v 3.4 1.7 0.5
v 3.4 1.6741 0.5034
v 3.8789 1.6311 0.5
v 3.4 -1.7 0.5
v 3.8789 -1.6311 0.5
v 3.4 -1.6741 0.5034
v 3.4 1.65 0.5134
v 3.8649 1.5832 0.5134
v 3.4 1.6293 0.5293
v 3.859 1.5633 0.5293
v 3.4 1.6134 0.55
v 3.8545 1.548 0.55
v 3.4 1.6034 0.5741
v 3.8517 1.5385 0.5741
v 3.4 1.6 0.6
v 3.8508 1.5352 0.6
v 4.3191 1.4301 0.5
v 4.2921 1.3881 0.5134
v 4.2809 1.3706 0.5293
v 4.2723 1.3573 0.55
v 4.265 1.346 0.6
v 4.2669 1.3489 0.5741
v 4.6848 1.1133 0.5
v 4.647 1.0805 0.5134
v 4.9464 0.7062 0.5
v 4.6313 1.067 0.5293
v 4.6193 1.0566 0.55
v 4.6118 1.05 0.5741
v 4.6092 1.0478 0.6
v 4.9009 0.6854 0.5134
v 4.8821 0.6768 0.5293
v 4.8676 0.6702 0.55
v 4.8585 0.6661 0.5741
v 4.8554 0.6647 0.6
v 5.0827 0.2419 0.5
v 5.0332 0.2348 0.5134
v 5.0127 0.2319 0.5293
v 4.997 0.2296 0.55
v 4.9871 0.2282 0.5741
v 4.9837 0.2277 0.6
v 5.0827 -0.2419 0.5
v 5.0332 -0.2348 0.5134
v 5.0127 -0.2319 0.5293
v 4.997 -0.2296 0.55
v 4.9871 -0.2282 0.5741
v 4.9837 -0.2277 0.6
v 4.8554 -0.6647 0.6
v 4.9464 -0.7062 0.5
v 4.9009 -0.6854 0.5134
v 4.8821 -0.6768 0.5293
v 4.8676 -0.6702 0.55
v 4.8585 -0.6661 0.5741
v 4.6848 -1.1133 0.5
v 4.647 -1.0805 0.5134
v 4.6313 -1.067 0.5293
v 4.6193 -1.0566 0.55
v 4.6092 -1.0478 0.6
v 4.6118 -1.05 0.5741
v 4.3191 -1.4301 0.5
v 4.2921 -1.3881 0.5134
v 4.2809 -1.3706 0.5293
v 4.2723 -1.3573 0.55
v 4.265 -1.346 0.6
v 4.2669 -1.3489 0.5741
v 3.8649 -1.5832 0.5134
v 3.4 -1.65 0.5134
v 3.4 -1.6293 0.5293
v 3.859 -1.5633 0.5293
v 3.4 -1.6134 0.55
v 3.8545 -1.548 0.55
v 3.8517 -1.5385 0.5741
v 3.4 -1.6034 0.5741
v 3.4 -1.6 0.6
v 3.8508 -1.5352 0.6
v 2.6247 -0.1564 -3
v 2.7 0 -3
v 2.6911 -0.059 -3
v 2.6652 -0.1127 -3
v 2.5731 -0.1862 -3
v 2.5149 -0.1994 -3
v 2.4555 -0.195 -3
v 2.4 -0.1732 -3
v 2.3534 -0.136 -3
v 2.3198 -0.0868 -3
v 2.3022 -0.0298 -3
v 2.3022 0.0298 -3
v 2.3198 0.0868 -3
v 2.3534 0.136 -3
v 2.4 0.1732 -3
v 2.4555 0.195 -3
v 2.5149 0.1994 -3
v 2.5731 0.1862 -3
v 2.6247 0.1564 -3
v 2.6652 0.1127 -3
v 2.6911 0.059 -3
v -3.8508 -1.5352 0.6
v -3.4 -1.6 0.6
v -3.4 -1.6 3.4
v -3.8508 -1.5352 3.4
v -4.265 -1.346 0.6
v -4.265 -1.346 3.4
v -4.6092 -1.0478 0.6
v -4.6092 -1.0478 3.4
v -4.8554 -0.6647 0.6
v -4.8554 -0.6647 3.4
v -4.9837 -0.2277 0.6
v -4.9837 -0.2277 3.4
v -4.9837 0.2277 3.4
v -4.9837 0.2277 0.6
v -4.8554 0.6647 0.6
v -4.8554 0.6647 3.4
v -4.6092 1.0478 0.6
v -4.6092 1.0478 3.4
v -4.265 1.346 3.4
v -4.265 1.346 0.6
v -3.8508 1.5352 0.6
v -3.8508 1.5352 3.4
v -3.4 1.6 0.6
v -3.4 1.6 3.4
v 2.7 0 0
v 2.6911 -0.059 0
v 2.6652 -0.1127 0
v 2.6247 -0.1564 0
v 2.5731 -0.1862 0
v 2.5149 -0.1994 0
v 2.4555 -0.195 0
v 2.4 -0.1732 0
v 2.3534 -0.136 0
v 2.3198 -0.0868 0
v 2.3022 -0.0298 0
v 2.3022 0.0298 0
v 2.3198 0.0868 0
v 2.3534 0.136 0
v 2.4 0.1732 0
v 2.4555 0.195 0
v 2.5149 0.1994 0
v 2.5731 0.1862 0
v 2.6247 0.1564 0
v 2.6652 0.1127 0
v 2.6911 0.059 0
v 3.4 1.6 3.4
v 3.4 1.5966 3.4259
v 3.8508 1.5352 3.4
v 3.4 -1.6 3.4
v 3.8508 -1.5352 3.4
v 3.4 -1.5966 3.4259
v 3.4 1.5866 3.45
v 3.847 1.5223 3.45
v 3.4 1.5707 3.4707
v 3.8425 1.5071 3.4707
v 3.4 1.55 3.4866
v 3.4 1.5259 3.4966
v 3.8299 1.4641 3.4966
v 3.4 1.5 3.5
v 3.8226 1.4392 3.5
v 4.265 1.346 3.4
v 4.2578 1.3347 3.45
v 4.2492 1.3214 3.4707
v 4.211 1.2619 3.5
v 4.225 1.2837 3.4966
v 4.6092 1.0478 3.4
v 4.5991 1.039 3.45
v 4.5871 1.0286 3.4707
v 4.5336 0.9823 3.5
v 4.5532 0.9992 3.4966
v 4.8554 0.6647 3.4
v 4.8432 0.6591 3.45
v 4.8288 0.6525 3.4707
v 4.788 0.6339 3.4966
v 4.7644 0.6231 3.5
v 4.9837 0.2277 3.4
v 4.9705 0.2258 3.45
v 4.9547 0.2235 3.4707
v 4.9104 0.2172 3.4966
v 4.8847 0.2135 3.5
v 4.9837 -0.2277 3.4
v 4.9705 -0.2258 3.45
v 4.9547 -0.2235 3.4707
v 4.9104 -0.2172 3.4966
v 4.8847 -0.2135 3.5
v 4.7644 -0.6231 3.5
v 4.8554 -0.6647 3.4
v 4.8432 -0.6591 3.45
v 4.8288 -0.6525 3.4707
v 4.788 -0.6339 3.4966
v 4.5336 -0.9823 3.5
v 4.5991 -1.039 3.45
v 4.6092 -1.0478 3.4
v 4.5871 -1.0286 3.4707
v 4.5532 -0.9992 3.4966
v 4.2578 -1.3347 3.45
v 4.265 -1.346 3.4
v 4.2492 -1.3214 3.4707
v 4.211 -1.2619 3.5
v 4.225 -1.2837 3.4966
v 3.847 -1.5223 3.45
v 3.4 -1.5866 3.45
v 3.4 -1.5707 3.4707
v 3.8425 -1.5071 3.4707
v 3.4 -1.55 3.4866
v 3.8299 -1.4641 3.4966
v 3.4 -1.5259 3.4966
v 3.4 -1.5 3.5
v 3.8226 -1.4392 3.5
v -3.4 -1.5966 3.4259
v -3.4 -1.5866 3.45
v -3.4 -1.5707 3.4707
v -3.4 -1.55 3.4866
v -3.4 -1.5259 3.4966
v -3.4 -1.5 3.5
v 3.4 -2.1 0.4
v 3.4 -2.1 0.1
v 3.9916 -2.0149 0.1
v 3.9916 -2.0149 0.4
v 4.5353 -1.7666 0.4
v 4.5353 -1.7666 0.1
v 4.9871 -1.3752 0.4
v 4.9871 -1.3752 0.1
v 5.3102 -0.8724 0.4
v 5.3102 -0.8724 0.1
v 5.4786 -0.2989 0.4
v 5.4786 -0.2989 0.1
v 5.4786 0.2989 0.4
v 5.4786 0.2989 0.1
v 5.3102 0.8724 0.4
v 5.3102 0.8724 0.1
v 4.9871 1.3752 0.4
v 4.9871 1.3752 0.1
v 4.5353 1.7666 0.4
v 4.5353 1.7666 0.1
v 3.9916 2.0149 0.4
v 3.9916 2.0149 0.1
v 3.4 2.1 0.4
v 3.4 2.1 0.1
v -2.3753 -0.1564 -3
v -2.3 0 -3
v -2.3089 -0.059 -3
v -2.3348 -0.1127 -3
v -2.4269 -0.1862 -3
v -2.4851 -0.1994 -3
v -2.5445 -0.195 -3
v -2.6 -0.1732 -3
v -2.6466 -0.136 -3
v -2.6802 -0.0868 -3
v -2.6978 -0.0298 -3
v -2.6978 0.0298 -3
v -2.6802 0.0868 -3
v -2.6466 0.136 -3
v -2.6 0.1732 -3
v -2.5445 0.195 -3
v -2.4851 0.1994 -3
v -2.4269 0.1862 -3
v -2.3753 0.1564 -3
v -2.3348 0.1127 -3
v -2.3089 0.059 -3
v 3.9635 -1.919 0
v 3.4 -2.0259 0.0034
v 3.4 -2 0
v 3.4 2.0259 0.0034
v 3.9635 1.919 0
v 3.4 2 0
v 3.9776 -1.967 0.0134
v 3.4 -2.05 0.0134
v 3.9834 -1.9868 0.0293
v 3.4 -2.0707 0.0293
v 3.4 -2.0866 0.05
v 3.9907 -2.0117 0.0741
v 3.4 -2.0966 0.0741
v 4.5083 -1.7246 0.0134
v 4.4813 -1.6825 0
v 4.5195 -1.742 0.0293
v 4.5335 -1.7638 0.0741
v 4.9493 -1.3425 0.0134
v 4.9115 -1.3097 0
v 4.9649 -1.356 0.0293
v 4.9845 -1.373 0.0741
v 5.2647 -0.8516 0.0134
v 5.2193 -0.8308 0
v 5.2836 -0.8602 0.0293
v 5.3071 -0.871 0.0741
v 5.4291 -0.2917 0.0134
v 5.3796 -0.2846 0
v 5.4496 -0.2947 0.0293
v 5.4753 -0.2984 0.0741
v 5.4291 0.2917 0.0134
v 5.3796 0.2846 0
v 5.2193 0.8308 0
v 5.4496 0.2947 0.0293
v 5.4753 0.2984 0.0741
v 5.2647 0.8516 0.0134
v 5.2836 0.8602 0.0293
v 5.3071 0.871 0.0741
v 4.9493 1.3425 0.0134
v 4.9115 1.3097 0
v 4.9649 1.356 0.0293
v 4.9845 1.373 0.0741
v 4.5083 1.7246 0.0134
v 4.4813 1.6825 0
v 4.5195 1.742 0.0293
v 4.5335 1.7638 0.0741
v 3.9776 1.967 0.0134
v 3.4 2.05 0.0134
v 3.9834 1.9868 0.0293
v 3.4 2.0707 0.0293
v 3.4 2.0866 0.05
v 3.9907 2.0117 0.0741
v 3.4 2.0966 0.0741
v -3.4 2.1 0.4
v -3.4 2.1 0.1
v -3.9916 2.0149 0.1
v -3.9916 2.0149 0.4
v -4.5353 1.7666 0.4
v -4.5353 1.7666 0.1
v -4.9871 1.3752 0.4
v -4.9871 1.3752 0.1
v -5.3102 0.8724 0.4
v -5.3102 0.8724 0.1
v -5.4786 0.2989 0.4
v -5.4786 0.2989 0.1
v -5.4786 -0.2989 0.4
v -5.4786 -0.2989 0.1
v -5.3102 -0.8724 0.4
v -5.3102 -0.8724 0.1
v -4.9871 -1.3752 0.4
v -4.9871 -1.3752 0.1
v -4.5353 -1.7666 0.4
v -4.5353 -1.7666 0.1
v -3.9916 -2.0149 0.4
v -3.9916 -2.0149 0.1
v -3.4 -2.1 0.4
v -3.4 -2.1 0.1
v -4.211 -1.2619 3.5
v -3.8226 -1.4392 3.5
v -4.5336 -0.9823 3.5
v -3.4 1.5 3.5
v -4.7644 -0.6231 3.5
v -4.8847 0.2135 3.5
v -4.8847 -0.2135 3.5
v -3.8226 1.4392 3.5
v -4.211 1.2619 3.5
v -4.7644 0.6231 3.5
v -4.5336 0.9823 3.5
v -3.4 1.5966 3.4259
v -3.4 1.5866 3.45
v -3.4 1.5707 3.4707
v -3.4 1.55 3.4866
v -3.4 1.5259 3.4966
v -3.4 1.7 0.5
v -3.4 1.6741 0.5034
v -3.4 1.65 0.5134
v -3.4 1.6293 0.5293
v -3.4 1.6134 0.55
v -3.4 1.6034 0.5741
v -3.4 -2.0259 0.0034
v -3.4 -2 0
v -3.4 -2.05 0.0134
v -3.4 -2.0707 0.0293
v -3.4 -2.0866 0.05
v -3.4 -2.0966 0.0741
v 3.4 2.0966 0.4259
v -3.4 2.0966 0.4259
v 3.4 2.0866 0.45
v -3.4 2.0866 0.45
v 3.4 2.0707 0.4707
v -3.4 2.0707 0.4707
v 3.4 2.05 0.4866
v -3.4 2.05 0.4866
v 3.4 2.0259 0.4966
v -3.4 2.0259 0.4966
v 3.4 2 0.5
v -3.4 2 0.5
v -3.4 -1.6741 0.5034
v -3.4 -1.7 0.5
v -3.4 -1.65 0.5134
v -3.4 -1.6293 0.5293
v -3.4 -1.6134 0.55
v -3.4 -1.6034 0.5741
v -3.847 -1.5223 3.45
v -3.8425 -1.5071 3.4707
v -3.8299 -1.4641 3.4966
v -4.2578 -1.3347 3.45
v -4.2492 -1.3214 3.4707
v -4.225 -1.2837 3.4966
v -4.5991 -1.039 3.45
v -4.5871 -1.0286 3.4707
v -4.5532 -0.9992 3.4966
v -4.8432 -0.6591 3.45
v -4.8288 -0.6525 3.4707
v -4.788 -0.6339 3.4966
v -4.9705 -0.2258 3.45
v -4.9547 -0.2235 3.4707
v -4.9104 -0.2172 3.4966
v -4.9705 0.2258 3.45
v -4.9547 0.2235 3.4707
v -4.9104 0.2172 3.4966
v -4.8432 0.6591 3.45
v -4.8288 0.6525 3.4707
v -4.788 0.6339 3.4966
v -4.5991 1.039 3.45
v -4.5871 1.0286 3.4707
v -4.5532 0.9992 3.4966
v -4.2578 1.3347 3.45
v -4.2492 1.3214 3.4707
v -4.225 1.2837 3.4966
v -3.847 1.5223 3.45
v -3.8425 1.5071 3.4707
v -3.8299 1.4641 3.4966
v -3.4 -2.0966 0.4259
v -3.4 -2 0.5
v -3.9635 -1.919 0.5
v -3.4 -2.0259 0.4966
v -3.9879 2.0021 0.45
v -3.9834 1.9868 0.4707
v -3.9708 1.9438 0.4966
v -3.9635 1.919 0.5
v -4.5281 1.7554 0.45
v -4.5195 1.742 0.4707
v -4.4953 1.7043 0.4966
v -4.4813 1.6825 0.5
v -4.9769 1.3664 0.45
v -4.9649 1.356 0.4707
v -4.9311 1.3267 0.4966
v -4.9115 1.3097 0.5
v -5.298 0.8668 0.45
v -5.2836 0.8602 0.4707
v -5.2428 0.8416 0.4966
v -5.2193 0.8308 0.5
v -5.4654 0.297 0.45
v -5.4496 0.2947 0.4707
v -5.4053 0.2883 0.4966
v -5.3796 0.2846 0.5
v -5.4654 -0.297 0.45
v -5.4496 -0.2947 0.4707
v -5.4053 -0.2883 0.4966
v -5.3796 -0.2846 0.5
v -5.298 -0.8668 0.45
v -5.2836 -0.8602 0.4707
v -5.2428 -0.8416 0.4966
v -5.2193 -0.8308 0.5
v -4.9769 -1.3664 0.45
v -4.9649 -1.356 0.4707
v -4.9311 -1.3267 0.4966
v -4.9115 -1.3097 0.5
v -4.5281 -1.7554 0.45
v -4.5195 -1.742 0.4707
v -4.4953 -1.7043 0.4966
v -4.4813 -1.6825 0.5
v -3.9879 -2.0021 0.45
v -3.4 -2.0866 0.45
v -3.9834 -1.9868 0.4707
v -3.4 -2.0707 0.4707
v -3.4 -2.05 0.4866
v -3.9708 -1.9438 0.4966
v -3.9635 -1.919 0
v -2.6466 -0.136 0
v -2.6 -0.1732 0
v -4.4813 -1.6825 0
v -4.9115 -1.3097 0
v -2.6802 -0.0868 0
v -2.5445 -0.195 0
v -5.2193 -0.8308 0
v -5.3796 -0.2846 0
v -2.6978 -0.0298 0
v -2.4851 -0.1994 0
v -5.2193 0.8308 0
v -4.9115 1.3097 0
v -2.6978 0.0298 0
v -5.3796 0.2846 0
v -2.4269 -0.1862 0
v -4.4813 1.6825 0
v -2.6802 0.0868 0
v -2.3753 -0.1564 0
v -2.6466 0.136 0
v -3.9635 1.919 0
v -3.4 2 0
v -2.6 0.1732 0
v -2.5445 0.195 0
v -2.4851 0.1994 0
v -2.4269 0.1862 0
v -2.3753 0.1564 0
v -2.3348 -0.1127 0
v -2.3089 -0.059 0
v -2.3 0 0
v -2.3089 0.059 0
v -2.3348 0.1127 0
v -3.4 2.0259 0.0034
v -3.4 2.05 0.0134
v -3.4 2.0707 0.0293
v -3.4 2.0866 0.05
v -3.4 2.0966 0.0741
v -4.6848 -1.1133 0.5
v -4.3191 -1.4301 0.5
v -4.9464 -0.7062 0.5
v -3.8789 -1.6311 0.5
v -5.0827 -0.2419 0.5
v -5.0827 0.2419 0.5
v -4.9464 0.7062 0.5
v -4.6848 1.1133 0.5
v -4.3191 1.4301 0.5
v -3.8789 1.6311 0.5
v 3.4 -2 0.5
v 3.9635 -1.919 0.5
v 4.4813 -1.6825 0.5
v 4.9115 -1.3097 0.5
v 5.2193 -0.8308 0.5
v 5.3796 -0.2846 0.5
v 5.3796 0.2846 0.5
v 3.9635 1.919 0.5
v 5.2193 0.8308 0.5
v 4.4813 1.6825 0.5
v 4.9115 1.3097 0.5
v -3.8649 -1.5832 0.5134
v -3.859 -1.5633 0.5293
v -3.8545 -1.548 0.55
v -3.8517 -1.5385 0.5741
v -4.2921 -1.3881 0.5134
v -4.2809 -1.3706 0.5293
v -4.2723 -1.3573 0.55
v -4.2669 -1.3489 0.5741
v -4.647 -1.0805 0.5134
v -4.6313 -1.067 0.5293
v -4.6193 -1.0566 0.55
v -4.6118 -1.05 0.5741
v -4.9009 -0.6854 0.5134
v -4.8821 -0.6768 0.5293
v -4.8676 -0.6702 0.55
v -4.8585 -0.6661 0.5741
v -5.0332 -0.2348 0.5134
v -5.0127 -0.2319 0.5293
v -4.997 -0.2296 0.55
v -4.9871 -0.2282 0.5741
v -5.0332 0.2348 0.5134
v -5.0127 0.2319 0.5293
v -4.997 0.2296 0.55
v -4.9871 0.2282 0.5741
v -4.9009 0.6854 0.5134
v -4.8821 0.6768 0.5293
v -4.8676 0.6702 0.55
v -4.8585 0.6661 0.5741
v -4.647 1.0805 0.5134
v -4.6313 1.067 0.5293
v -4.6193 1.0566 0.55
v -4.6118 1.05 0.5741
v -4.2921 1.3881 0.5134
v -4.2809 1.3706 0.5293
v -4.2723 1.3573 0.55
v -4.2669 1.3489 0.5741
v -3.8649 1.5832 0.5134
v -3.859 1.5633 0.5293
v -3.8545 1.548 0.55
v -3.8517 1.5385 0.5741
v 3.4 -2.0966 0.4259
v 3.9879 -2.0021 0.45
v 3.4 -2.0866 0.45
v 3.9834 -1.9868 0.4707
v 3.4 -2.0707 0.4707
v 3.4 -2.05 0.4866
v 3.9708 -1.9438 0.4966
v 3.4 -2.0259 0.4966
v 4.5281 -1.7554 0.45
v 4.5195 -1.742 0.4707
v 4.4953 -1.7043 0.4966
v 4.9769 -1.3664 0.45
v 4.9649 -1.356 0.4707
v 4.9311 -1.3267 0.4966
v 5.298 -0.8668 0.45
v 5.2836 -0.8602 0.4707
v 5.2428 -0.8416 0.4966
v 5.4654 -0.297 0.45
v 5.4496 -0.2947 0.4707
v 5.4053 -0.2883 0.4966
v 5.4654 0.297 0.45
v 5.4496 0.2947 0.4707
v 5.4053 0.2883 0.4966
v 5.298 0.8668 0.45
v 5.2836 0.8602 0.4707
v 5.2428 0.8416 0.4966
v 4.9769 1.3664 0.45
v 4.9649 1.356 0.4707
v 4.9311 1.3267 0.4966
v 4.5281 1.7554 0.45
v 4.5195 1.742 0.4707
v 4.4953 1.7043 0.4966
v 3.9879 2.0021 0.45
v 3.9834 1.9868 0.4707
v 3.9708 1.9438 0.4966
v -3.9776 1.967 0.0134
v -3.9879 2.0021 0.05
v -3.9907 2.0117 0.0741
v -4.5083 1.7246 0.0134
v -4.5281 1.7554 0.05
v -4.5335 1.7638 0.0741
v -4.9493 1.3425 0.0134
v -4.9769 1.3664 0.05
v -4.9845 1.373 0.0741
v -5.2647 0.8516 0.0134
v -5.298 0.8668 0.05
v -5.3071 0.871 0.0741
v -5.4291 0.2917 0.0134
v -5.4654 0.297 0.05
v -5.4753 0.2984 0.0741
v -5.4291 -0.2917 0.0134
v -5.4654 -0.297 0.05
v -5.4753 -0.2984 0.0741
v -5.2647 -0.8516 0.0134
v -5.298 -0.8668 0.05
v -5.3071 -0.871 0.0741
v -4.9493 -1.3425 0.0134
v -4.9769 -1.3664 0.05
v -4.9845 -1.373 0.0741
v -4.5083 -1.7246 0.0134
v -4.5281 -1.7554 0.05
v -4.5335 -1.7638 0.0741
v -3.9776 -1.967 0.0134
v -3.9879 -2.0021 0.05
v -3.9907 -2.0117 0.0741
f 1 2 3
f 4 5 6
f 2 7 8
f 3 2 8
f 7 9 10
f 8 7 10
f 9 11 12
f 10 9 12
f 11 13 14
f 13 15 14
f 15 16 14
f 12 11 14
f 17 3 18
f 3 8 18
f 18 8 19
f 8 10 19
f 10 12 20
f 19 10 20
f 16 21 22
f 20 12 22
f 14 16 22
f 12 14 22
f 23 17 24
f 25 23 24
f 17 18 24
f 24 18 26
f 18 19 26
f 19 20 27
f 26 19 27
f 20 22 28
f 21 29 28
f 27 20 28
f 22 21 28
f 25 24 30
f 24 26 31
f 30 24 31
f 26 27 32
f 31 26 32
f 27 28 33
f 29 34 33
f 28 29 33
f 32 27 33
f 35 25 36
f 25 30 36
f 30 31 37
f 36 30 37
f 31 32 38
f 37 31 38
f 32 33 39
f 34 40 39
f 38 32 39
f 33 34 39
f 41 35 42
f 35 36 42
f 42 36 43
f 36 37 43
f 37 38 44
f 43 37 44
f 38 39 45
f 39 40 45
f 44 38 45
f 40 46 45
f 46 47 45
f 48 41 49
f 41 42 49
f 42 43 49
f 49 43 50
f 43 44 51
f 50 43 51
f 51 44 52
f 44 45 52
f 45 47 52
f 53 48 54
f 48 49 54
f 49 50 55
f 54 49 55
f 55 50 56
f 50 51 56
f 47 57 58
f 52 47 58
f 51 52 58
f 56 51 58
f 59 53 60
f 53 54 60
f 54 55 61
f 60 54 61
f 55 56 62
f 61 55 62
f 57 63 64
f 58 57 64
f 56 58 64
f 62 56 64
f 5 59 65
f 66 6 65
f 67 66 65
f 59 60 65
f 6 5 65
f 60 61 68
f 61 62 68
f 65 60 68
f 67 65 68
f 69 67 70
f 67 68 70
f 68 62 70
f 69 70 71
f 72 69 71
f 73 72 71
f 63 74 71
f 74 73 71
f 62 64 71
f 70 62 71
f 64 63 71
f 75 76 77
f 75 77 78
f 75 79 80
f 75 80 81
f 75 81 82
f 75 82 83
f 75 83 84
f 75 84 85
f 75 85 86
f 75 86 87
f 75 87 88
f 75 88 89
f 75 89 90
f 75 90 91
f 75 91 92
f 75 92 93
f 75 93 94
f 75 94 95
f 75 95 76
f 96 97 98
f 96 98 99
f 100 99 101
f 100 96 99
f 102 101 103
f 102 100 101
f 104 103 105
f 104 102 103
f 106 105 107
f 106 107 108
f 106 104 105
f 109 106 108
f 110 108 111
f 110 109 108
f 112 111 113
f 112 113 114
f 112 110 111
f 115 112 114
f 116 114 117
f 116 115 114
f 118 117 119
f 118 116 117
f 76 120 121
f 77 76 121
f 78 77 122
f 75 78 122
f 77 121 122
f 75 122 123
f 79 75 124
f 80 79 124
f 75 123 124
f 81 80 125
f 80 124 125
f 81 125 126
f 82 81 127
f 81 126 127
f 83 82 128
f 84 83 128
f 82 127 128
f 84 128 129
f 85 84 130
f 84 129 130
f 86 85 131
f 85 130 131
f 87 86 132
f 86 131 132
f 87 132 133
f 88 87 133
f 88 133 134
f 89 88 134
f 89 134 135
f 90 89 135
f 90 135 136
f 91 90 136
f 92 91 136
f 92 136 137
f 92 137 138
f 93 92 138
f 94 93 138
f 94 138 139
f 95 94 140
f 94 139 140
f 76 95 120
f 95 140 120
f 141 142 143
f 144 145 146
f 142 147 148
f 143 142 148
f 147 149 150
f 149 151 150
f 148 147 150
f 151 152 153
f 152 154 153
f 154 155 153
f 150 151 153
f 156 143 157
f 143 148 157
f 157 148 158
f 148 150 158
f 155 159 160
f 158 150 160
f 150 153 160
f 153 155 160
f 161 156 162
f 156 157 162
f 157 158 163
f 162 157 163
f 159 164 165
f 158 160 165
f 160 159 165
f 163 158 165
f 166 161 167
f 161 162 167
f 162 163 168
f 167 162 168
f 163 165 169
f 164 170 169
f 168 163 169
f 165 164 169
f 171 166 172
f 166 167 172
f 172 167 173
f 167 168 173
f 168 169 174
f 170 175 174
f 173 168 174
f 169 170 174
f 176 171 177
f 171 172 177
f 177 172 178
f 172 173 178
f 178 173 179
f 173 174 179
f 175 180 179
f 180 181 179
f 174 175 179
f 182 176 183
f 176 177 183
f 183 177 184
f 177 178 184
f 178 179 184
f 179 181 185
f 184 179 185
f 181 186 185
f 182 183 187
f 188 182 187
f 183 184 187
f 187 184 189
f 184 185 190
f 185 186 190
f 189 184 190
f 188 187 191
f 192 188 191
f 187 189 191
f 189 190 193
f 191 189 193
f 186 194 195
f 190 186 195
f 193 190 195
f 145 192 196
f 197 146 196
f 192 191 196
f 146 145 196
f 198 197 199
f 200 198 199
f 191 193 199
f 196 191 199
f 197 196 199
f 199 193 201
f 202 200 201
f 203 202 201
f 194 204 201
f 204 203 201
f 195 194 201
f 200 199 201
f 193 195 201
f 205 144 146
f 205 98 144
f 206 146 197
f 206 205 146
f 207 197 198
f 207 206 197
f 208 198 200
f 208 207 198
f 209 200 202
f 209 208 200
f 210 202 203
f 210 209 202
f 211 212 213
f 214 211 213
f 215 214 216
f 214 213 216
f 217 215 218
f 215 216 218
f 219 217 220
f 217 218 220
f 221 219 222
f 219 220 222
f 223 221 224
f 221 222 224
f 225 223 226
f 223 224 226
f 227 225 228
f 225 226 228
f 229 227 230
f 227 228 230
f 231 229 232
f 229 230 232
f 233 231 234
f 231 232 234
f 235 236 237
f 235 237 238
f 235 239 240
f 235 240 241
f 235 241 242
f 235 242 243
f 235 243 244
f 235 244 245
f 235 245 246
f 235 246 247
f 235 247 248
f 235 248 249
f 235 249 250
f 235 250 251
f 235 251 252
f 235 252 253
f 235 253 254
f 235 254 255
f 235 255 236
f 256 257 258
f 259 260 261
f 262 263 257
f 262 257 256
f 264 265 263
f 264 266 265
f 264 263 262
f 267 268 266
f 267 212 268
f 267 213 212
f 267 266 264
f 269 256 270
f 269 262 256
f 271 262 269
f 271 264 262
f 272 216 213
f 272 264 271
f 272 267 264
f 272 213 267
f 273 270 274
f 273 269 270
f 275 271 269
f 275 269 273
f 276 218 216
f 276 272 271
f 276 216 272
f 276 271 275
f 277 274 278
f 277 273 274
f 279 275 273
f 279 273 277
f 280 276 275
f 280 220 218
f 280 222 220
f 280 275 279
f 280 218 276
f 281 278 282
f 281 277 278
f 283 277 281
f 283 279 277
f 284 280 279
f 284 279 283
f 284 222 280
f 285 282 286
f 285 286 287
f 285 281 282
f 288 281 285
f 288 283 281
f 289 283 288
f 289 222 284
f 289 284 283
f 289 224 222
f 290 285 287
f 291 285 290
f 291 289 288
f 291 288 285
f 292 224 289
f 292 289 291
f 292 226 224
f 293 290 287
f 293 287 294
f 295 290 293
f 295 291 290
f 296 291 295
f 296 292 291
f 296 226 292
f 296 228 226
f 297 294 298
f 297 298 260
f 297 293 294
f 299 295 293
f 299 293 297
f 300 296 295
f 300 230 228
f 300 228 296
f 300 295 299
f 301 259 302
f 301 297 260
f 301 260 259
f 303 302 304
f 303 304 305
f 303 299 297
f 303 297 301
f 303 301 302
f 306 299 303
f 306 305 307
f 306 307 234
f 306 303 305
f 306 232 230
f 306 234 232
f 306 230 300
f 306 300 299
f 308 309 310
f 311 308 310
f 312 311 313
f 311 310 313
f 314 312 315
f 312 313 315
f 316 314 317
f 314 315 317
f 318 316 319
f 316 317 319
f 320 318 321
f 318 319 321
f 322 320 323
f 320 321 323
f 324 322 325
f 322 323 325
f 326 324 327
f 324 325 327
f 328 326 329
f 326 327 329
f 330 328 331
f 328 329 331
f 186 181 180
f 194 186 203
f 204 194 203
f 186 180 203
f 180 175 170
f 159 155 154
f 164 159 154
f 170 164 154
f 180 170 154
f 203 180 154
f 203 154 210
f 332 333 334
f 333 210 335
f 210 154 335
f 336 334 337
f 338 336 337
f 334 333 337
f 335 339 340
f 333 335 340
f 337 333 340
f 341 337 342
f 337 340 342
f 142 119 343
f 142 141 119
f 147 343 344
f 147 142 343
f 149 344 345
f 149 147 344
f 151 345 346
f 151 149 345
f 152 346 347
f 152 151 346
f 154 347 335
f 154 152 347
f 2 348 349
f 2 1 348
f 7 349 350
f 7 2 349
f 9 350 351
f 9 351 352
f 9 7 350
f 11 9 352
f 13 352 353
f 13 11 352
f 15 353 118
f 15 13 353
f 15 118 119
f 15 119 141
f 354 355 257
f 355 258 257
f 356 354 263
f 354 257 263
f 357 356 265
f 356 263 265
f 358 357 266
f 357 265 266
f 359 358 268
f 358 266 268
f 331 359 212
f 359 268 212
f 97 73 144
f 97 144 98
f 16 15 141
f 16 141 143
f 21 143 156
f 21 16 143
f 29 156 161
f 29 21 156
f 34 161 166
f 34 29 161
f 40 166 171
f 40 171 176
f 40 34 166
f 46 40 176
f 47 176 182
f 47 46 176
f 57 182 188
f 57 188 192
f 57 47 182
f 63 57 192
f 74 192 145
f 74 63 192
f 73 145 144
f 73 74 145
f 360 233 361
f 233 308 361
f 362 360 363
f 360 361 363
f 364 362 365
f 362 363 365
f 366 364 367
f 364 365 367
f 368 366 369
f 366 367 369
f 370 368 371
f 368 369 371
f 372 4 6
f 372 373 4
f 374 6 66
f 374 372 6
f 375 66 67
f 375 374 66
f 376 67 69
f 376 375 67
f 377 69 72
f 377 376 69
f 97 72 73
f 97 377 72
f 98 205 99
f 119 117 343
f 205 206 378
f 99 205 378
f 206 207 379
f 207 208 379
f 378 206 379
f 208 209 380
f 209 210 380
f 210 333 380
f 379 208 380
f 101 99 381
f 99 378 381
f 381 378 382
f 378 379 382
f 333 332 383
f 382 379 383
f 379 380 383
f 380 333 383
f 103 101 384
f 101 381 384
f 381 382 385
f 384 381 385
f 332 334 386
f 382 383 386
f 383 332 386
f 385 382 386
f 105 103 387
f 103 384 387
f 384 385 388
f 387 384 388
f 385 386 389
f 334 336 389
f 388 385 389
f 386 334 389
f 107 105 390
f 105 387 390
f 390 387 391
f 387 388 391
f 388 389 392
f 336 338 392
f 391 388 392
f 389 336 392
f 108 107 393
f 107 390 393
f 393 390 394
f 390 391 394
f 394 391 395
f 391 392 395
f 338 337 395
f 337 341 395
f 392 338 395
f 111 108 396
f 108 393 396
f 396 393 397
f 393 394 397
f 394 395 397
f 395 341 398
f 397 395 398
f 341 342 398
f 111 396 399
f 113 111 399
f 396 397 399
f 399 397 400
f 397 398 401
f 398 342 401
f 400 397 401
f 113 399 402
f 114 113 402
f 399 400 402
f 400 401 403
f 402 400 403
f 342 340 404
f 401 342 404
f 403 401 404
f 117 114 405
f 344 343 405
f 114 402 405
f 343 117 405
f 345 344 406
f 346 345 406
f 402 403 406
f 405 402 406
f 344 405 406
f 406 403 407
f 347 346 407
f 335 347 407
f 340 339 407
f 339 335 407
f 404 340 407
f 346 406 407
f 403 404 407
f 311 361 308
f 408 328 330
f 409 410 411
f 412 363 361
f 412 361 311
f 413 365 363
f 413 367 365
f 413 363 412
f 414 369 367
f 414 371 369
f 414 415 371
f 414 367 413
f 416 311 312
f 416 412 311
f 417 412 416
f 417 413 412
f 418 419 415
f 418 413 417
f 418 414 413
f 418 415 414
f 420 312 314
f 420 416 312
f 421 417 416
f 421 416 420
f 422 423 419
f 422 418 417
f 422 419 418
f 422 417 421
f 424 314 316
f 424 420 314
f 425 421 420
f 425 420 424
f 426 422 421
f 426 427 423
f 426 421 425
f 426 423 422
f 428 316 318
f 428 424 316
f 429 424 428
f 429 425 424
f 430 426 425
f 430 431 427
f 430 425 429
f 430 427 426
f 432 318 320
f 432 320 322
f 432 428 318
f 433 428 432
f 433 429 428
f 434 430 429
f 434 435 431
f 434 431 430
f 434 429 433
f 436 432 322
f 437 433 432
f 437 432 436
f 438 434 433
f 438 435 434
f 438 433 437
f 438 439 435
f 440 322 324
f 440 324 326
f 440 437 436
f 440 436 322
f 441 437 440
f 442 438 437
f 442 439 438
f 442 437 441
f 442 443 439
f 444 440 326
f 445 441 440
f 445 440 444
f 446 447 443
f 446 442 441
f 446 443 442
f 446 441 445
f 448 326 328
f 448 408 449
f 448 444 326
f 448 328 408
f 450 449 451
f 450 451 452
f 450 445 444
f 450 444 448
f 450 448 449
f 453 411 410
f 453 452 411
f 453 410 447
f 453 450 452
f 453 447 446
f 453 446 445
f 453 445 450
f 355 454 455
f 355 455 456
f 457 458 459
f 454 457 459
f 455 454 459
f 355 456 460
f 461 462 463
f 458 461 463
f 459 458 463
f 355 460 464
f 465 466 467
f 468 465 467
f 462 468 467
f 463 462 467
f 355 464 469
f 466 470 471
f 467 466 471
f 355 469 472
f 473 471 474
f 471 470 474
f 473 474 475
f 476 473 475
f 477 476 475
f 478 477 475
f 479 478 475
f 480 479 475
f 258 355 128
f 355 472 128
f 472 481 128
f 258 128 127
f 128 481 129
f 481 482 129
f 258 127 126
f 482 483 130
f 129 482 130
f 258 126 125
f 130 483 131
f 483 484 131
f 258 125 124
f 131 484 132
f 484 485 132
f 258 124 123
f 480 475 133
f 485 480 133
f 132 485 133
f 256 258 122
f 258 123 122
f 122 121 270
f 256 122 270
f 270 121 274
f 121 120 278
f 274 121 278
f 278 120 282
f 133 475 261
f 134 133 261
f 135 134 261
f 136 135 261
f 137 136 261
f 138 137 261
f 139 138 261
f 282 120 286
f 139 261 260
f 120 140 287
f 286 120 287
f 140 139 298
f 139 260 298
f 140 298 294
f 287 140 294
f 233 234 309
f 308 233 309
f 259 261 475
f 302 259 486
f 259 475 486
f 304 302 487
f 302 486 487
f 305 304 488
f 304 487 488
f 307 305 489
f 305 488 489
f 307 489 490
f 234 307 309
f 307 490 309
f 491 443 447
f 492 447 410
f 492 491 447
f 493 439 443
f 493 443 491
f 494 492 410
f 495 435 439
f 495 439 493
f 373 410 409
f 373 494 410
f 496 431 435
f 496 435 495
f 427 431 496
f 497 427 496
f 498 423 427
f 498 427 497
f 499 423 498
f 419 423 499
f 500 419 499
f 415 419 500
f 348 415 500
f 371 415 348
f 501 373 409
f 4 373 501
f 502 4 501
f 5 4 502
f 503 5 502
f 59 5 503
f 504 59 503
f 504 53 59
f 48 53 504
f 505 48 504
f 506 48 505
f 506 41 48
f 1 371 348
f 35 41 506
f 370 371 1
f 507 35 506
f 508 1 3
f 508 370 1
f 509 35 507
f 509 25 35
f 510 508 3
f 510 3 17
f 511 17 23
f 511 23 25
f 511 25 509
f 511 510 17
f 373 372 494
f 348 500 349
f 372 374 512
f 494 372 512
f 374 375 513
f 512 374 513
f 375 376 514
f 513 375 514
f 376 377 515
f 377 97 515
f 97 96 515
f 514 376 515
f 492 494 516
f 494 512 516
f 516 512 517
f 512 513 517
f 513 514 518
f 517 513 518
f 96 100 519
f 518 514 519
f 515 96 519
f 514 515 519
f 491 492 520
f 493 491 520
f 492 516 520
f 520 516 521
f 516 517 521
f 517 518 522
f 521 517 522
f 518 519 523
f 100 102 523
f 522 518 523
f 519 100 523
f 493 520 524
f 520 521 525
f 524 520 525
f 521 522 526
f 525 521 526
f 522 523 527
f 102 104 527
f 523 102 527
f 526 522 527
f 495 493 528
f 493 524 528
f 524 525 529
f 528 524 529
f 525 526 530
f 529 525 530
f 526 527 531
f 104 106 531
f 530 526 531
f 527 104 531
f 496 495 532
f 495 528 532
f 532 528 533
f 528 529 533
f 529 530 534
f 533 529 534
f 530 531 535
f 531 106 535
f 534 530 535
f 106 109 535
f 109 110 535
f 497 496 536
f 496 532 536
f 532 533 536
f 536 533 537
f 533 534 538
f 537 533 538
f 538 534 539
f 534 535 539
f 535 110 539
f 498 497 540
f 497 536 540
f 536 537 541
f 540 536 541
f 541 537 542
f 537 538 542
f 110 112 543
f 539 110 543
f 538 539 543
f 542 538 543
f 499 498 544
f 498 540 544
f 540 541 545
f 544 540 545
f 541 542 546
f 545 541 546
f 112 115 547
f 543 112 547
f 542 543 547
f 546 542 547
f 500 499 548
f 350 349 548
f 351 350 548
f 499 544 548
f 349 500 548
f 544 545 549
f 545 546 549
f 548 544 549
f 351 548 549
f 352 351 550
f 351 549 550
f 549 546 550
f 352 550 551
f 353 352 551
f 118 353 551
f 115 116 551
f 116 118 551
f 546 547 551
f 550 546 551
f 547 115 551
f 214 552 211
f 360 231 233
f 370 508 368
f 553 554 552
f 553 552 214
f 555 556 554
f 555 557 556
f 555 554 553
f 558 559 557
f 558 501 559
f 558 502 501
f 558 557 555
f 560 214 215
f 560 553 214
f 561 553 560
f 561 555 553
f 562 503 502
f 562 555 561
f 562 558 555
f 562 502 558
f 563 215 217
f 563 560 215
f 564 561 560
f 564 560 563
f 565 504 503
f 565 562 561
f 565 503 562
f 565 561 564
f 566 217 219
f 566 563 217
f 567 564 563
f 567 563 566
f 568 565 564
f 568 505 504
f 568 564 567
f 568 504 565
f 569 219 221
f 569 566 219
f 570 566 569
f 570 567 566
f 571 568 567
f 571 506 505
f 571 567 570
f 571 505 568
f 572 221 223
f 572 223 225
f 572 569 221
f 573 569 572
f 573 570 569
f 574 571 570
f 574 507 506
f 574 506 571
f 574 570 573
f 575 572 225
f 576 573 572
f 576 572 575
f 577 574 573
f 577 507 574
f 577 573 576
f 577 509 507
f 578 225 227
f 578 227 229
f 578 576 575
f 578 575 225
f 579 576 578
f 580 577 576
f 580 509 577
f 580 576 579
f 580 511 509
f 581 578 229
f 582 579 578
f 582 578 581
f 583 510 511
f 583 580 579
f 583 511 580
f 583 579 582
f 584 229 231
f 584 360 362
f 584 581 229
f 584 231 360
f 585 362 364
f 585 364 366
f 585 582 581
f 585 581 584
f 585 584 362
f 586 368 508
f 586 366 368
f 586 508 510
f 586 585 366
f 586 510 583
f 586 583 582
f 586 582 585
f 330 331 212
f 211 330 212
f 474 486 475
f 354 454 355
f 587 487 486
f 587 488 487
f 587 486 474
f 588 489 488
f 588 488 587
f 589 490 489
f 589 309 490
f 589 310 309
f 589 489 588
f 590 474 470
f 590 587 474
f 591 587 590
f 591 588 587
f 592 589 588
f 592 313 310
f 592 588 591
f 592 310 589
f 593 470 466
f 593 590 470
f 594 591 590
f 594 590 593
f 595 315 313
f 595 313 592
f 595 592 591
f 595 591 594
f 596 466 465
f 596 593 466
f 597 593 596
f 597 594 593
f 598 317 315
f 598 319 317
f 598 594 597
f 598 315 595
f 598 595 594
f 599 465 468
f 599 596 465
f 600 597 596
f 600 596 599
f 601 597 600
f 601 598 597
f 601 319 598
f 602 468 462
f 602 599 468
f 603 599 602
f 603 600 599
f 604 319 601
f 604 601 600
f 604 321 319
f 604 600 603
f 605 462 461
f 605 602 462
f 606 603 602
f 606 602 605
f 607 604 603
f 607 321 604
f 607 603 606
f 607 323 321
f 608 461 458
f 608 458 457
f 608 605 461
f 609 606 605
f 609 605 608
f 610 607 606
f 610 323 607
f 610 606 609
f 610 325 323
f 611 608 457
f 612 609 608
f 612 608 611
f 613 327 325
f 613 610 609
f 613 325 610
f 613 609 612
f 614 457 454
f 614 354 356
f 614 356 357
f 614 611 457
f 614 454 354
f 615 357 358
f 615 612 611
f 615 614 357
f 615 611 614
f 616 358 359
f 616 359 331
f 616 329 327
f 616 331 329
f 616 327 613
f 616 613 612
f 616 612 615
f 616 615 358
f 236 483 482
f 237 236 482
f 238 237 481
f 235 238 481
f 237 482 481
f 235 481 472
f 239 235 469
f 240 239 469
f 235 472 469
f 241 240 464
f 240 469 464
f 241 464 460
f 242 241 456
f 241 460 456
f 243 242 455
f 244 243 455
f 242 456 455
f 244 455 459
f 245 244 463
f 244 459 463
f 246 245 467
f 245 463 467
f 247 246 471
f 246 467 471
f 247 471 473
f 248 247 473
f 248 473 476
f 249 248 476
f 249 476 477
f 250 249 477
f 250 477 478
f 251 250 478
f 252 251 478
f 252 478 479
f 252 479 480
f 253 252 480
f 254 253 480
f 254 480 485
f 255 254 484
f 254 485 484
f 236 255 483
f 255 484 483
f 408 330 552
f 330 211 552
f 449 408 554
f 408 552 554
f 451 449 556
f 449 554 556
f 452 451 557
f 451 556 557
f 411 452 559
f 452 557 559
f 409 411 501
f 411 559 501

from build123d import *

# Parameters (mm, degrees)
EXTRUDE_1_DEPTH = 0.5
EXTRUDE_2_DEPTH = 3
SKETCH_3_R      = 0.2
EXTRUDE_3_DEPTH = 3
FILLET_1_R      = 0.1


with BuildPart() as part:
    # 草图1 → 凸台-拉伸1 (new body)
    with BuildSketch(Plane.XY):
        with BuildLine():
            Line((3.4, 2.1), (-3.4, 2.1))
            ThreePointArc((-3.4, 2.1), (-5.5, 0), (-3.4, -2.1))
            Line((-3.4, -2.1), (3.4, -2.1))
            ThreePointArc((3.4, -2.1), (5.5, 0), (3.4, 2.1))
        make_face()
    extrude(amount=EXTRUDE_1_DEPTH)

    # 草图2 → 凸台-拉伸2 (add)
    with BuildSketch(Plane.XY.offset(0.5)):
        with BuildLine():
            Line((-3.4, 1.6), (3.4, 1.6))
            ThreePointArc((3.4, 1.6), (5, 0), (3.4, -1.6))
            Line((3.4, -1.6), (-3.4, -1.6))
            ThreePointArc((-3.4, -1.6), (-5, 0), (-3.4, 1.6))
        make_face()
    extrude(amount=EXTRUDE_2_DEPTH)

    # 草图3 → 凸台-拉伸3 (add)
    with BuildSketch(Plane(origin=(0, 0, 0), x_dir=(-1, 0, 0), z_dir=(0, 0, -1))):
        with Locations(Location((-2.5, 0, 0), (0, 0, 180))):
            Circle(SKETCH_3_R)
        with Locations(Location((2.5, 0, 0), (0, 0, 180))):
            Circle(SKETCH_3_R)
    extrude(amount=EXTRUDE_3_DEPTH)

    # 圆角1
    fillet_1_edges = [part.edges().sort_by_distance(p)[0] for p in [
        (-5.5, 0, 0.5),
        (0, -2.1, 0.5),
        (5, 0, 0.5),
        (0, 1.6, 0.5),
        (-5, 0, 0.5),
        (0, -1.6, 0.5),
        (5, 0, 3.5),
        (0, 1.6, 3.5),
        (-5, 0, 3.5),
        (0, -1.6, 3.5),
        (5.5, 0, 0.5),
        (0, -2.1, 0),
        (-5.5, 0, 0),
        (0, 2.1, 0),
        (5.5, 0, 0),
        (0, 2.1, 0.5),
    ]]
    fillet(fillet_1_edges, radius=FILLET_1_R)


solid = part.part
